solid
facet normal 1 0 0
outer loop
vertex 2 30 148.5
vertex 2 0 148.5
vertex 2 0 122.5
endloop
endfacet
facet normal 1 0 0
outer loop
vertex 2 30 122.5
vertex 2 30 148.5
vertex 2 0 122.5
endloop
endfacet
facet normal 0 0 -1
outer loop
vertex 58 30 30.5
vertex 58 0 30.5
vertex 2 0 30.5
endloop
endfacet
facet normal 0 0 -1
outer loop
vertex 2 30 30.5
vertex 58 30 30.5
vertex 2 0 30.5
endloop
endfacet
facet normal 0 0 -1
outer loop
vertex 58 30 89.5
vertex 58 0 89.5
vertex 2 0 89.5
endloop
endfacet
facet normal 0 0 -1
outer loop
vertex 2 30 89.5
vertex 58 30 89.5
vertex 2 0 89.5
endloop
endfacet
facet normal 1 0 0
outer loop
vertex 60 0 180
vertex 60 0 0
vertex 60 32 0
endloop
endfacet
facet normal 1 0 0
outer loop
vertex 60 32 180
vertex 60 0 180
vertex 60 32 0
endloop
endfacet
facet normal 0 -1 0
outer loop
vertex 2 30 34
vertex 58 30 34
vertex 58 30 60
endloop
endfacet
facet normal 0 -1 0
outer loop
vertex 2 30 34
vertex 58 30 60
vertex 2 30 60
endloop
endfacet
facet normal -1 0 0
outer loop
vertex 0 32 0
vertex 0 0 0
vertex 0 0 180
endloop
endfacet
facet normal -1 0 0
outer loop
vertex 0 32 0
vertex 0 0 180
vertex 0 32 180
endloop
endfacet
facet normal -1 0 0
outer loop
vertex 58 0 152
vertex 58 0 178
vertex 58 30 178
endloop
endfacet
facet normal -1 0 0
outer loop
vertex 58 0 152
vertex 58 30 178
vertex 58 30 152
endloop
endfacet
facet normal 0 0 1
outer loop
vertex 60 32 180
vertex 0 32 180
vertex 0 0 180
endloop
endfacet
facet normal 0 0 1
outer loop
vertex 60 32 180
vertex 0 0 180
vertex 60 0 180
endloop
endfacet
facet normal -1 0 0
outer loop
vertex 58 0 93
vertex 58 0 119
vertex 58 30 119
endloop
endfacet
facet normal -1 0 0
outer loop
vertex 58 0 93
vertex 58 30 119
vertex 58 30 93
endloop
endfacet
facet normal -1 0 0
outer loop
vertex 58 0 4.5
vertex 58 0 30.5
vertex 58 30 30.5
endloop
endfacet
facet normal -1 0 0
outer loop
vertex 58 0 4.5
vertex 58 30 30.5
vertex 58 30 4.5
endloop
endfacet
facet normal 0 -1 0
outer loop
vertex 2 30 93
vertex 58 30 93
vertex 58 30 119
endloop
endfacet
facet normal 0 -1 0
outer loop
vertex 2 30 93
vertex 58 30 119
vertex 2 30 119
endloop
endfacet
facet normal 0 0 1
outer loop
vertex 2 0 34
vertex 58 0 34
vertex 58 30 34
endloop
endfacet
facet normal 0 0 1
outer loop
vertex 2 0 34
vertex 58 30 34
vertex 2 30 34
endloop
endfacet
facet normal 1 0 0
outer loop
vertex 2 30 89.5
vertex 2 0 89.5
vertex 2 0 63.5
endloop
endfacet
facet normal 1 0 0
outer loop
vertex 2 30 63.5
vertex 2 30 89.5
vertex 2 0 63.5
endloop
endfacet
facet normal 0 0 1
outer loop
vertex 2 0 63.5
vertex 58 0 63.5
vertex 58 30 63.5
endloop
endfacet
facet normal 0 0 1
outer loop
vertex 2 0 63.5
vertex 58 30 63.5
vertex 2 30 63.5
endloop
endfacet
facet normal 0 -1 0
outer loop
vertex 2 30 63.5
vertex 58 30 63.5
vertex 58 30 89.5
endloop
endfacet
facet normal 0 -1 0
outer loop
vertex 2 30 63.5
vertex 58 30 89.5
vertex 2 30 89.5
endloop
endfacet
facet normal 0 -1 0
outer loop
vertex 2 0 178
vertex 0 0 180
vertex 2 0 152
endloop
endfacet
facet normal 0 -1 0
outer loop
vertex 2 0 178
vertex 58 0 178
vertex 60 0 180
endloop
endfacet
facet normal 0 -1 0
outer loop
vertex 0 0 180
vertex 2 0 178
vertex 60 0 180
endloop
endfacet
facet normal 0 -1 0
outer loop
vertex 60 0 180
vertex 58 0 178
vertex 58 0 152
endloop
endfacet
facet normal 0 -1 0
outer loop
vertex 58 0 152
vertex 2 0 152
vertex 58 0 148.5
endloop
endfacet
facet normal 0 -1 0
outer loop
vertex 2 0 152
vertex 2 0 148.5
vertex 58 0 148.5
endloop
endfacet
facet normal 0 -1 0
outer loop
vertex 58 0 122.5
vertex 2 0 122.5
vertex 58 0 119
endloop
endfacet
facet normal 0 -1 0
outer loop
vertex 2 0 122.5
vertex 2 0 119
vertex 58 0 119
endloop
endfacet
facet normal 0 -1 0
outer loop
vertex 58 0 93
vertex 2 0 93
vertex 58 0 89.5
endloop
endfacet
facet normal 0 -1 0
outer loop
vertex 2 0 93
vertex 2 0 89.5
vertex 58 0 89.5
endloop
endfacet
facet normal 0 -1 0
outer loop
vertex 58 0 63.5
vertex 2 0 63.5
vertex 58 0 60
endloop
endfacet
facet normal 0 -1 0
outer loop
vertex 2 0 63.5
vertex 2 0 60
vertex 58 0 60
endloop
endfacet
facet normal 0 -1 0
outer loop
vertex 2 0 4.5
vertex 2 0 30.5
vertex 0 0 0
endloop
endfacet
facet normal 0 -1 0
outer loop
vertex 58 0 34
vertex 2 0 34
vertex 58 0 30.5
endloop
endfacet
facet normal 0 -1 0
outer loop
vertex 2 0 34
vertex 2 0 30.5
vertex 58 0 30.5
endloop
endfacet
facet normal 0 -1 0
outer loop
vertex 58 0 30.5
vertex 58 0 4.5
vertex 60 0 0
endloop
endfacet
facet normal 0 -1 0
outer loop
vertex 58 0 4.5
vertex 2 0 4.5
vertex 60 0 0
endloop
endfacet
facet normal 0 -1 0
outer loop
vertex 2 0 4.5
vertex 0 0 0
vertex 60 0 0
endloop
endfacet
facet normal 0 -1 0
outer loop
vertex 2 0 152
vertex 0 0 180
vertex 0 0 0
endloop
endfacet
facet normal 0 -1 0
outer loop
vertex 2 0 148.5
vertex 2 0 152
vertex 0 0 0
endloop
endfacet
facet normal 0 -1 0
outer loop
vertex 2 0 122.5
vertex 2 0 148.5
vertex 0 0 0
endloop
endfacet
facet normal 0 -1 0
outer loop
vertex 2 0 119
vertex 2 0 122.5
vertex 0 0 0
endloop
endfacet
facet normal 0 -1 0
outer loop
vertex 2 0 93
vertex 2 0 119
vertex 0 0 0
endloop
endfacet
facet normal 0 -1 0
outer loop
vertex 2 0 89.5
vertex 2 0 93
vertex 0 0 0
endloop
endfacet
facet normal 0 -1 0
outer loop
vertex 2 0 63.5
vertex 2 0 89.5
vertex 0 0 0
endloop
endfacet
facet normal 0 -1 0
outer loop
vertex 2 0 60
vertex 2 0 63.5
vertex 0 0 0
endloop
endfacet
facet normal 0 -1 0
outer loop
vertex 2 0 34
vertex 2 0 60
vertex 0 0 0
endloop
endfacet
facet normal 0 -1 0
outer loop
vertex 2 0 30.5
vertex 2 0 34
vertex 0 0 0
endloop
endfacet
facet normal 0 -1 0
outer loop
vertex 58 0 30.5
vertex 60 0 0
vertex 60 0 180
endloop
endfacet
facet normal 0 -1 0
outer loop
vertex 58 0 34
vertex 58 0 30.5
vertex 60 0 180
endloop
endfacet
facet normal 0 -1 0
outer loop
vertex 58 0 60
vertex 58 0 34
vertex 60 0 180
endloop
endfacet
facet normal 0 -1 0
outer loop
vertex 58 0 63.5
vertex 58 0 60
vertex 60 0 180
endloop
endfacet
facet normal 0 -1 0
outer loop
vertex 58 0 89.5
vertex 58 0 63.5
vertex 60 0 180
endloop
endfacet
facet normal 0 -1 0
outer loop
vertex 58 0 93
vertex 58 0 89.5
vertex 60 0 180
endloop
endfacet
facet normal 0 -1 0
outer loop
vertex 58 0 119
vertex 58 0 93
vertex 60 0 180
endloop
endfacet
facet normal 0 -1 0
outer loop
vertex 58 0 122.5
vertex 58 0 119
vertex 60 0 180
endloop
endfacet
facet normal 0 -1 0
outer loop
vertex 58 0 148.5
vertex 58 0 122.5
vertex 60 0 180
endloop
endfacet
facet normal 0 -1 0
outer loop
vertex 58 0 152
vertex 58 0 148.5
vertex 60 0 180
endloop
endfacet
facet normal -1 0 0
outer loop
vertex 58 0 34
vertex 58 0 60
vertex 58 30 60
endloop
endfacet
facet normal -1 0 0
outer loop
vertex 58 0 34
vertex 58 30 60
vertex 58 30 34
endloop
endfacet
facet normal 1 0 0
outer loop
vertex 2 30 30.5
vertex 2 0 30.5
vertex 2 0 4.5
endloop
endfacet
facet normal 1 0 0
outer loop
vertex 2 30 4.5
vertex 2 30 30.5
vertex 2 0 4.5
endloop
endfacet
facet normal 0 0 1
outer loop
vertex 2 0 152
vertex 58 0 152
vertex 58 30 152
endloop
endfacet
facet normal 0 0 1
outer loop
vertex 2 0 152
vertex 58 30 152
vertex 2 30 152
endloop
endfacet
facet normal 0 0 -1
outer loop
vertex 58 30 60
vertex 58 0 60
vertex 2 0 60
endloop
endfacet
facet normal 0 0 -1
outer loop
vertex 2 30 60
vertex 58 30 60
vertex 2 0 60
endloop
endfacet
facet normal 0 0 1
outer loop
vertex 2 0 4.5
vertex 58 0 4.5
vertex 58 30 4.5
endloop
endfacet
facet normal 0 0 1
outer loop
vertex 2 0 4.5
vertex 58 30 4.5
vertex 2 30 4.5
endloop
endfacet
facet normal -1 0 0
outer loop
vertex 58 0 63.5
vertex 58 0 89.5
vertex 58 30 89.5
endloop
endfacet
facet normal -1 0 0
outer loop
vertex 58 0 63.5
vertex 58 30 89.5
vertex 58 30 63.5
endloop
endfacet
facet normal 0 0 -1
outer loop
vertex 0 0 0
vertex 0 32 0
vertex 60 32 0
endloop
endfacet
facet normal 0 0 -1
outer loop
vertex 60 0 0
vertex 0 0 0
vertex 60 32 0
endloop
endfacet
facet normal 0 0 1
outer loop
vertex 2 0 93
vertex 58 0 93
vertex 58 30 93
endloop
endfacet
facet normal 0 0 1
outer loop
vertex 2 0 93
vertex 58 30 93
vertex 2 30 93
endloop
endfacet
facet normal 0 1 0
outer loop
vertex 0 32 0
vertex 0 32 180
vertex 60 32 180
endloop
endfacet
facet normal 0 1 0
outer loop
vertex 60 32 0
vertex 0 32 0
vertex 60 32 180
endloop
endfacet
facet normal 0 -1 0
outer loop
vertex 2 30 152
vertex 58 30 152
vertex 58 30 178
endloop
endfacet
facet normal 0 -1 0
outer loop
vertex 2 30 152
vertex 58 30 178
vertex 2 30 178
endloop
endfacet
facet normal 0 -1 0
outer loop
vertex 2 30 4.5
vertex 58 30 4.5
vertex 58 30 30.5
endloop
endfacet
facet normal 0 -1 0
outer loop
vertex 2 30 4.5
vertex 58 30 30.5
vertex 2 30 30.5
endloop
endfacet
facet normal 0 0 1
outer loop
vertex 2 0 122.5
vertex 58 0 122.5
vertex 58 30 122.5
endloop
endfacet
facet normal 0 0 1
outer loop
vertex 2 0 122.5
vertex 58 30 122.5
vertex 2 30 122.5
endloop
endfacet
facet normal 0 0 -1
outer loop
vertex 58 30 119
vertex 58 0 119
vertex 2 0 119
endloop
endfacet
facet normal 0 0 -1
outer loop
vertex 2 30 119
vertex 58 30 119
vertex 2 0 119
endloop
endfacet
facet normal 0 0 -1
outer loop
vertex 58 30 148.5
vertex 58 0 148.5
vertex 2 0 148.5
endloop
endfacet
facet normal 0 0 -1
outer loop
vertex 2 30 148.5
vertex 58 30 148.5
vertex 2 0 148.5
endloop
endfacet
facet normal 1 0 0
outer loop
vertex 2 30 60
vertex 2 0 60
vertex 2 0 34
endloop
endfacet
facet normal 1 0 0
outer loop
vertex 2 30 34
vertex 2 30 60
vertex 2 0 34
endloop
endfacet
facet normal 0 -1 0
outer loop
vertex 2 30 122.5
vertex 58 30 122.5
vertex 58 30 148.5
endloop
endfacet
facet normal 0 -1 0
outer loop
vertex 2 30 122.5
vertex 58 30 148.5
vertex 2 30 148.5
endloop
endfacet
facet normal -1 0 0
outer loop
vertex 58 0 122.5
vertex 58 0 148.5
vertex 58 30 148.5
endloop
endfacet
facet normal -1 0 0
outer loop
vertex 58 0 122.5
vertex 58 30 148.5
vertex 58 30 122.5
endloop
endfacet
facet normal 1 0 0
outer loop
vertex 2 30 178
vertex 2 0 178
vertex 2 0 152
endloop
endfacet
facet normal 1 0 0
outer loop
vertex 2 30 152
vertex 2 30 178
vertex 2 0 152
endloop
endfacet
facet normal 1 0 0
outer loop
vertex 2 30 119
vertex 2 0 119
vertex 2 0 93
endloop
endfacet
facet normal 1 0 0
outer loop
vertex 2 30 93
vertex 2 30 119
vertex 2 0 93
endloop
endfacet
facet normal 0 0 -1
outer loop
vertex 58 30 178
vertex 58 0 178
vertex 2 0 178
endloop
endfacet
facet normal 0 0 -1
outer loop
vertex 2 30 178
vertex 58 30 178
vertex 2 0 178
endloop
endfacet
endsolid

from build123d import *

# Parameters (mm, degrees)
SKETCH_1_W          = 60
SKETCH_1_H          = 32
EXTRUDE_1_DEPTH     = 180
SKETCH_2_W          = 56
SKETCH_2_H          = 26
CUT_EXTRUDE_1_DEPTH = 30


with BuildPart() as part:
    # 草图1 → 凸台-拉伸1 (new body)
    with BuildSketch(Plane.XY):
        with Locations((30, 16)):
            Rectangle(SKETCH_1_W, SKETCH_1_H)
    extrude(amount=EXTRUDE_1_DEPTH)

    # 草图2 → 切除-拉伸1 (cut)
    with BuildSketch(Plane(origin=(0, 0, 0), x_dir=(-1, 0, 0), z_dir=(0, -1, 0))):
        with Locations((-30, -165)):
            Rectangle(SKETCH_2_W, SKETCH_2_H)
        with Locations((-30, -135.5)):
            Rectangle(SKETCH_2_W, SKETCH_2_H)
        with Locations((-30, -106)):
            Rectangle(SKETCH_2_W, SKETCH_2_H)
        with Locations((-30, -76.5)):
            Rectangle(SKETCH_2_W, SKETCH_2_H)
        with Locations((-30, -47)):
            Rectangle(SKETCH_2_W, SKETCH_2_H)
        with Locations((-30, -17.5)):
            Rectangle(SKETCH_2_W, SKETCH_2_H)
    extrude(amount=-CUT_EXTRUDE_1_DEPTH, mode=Mode.SUBTRACT)


solid = part.part
